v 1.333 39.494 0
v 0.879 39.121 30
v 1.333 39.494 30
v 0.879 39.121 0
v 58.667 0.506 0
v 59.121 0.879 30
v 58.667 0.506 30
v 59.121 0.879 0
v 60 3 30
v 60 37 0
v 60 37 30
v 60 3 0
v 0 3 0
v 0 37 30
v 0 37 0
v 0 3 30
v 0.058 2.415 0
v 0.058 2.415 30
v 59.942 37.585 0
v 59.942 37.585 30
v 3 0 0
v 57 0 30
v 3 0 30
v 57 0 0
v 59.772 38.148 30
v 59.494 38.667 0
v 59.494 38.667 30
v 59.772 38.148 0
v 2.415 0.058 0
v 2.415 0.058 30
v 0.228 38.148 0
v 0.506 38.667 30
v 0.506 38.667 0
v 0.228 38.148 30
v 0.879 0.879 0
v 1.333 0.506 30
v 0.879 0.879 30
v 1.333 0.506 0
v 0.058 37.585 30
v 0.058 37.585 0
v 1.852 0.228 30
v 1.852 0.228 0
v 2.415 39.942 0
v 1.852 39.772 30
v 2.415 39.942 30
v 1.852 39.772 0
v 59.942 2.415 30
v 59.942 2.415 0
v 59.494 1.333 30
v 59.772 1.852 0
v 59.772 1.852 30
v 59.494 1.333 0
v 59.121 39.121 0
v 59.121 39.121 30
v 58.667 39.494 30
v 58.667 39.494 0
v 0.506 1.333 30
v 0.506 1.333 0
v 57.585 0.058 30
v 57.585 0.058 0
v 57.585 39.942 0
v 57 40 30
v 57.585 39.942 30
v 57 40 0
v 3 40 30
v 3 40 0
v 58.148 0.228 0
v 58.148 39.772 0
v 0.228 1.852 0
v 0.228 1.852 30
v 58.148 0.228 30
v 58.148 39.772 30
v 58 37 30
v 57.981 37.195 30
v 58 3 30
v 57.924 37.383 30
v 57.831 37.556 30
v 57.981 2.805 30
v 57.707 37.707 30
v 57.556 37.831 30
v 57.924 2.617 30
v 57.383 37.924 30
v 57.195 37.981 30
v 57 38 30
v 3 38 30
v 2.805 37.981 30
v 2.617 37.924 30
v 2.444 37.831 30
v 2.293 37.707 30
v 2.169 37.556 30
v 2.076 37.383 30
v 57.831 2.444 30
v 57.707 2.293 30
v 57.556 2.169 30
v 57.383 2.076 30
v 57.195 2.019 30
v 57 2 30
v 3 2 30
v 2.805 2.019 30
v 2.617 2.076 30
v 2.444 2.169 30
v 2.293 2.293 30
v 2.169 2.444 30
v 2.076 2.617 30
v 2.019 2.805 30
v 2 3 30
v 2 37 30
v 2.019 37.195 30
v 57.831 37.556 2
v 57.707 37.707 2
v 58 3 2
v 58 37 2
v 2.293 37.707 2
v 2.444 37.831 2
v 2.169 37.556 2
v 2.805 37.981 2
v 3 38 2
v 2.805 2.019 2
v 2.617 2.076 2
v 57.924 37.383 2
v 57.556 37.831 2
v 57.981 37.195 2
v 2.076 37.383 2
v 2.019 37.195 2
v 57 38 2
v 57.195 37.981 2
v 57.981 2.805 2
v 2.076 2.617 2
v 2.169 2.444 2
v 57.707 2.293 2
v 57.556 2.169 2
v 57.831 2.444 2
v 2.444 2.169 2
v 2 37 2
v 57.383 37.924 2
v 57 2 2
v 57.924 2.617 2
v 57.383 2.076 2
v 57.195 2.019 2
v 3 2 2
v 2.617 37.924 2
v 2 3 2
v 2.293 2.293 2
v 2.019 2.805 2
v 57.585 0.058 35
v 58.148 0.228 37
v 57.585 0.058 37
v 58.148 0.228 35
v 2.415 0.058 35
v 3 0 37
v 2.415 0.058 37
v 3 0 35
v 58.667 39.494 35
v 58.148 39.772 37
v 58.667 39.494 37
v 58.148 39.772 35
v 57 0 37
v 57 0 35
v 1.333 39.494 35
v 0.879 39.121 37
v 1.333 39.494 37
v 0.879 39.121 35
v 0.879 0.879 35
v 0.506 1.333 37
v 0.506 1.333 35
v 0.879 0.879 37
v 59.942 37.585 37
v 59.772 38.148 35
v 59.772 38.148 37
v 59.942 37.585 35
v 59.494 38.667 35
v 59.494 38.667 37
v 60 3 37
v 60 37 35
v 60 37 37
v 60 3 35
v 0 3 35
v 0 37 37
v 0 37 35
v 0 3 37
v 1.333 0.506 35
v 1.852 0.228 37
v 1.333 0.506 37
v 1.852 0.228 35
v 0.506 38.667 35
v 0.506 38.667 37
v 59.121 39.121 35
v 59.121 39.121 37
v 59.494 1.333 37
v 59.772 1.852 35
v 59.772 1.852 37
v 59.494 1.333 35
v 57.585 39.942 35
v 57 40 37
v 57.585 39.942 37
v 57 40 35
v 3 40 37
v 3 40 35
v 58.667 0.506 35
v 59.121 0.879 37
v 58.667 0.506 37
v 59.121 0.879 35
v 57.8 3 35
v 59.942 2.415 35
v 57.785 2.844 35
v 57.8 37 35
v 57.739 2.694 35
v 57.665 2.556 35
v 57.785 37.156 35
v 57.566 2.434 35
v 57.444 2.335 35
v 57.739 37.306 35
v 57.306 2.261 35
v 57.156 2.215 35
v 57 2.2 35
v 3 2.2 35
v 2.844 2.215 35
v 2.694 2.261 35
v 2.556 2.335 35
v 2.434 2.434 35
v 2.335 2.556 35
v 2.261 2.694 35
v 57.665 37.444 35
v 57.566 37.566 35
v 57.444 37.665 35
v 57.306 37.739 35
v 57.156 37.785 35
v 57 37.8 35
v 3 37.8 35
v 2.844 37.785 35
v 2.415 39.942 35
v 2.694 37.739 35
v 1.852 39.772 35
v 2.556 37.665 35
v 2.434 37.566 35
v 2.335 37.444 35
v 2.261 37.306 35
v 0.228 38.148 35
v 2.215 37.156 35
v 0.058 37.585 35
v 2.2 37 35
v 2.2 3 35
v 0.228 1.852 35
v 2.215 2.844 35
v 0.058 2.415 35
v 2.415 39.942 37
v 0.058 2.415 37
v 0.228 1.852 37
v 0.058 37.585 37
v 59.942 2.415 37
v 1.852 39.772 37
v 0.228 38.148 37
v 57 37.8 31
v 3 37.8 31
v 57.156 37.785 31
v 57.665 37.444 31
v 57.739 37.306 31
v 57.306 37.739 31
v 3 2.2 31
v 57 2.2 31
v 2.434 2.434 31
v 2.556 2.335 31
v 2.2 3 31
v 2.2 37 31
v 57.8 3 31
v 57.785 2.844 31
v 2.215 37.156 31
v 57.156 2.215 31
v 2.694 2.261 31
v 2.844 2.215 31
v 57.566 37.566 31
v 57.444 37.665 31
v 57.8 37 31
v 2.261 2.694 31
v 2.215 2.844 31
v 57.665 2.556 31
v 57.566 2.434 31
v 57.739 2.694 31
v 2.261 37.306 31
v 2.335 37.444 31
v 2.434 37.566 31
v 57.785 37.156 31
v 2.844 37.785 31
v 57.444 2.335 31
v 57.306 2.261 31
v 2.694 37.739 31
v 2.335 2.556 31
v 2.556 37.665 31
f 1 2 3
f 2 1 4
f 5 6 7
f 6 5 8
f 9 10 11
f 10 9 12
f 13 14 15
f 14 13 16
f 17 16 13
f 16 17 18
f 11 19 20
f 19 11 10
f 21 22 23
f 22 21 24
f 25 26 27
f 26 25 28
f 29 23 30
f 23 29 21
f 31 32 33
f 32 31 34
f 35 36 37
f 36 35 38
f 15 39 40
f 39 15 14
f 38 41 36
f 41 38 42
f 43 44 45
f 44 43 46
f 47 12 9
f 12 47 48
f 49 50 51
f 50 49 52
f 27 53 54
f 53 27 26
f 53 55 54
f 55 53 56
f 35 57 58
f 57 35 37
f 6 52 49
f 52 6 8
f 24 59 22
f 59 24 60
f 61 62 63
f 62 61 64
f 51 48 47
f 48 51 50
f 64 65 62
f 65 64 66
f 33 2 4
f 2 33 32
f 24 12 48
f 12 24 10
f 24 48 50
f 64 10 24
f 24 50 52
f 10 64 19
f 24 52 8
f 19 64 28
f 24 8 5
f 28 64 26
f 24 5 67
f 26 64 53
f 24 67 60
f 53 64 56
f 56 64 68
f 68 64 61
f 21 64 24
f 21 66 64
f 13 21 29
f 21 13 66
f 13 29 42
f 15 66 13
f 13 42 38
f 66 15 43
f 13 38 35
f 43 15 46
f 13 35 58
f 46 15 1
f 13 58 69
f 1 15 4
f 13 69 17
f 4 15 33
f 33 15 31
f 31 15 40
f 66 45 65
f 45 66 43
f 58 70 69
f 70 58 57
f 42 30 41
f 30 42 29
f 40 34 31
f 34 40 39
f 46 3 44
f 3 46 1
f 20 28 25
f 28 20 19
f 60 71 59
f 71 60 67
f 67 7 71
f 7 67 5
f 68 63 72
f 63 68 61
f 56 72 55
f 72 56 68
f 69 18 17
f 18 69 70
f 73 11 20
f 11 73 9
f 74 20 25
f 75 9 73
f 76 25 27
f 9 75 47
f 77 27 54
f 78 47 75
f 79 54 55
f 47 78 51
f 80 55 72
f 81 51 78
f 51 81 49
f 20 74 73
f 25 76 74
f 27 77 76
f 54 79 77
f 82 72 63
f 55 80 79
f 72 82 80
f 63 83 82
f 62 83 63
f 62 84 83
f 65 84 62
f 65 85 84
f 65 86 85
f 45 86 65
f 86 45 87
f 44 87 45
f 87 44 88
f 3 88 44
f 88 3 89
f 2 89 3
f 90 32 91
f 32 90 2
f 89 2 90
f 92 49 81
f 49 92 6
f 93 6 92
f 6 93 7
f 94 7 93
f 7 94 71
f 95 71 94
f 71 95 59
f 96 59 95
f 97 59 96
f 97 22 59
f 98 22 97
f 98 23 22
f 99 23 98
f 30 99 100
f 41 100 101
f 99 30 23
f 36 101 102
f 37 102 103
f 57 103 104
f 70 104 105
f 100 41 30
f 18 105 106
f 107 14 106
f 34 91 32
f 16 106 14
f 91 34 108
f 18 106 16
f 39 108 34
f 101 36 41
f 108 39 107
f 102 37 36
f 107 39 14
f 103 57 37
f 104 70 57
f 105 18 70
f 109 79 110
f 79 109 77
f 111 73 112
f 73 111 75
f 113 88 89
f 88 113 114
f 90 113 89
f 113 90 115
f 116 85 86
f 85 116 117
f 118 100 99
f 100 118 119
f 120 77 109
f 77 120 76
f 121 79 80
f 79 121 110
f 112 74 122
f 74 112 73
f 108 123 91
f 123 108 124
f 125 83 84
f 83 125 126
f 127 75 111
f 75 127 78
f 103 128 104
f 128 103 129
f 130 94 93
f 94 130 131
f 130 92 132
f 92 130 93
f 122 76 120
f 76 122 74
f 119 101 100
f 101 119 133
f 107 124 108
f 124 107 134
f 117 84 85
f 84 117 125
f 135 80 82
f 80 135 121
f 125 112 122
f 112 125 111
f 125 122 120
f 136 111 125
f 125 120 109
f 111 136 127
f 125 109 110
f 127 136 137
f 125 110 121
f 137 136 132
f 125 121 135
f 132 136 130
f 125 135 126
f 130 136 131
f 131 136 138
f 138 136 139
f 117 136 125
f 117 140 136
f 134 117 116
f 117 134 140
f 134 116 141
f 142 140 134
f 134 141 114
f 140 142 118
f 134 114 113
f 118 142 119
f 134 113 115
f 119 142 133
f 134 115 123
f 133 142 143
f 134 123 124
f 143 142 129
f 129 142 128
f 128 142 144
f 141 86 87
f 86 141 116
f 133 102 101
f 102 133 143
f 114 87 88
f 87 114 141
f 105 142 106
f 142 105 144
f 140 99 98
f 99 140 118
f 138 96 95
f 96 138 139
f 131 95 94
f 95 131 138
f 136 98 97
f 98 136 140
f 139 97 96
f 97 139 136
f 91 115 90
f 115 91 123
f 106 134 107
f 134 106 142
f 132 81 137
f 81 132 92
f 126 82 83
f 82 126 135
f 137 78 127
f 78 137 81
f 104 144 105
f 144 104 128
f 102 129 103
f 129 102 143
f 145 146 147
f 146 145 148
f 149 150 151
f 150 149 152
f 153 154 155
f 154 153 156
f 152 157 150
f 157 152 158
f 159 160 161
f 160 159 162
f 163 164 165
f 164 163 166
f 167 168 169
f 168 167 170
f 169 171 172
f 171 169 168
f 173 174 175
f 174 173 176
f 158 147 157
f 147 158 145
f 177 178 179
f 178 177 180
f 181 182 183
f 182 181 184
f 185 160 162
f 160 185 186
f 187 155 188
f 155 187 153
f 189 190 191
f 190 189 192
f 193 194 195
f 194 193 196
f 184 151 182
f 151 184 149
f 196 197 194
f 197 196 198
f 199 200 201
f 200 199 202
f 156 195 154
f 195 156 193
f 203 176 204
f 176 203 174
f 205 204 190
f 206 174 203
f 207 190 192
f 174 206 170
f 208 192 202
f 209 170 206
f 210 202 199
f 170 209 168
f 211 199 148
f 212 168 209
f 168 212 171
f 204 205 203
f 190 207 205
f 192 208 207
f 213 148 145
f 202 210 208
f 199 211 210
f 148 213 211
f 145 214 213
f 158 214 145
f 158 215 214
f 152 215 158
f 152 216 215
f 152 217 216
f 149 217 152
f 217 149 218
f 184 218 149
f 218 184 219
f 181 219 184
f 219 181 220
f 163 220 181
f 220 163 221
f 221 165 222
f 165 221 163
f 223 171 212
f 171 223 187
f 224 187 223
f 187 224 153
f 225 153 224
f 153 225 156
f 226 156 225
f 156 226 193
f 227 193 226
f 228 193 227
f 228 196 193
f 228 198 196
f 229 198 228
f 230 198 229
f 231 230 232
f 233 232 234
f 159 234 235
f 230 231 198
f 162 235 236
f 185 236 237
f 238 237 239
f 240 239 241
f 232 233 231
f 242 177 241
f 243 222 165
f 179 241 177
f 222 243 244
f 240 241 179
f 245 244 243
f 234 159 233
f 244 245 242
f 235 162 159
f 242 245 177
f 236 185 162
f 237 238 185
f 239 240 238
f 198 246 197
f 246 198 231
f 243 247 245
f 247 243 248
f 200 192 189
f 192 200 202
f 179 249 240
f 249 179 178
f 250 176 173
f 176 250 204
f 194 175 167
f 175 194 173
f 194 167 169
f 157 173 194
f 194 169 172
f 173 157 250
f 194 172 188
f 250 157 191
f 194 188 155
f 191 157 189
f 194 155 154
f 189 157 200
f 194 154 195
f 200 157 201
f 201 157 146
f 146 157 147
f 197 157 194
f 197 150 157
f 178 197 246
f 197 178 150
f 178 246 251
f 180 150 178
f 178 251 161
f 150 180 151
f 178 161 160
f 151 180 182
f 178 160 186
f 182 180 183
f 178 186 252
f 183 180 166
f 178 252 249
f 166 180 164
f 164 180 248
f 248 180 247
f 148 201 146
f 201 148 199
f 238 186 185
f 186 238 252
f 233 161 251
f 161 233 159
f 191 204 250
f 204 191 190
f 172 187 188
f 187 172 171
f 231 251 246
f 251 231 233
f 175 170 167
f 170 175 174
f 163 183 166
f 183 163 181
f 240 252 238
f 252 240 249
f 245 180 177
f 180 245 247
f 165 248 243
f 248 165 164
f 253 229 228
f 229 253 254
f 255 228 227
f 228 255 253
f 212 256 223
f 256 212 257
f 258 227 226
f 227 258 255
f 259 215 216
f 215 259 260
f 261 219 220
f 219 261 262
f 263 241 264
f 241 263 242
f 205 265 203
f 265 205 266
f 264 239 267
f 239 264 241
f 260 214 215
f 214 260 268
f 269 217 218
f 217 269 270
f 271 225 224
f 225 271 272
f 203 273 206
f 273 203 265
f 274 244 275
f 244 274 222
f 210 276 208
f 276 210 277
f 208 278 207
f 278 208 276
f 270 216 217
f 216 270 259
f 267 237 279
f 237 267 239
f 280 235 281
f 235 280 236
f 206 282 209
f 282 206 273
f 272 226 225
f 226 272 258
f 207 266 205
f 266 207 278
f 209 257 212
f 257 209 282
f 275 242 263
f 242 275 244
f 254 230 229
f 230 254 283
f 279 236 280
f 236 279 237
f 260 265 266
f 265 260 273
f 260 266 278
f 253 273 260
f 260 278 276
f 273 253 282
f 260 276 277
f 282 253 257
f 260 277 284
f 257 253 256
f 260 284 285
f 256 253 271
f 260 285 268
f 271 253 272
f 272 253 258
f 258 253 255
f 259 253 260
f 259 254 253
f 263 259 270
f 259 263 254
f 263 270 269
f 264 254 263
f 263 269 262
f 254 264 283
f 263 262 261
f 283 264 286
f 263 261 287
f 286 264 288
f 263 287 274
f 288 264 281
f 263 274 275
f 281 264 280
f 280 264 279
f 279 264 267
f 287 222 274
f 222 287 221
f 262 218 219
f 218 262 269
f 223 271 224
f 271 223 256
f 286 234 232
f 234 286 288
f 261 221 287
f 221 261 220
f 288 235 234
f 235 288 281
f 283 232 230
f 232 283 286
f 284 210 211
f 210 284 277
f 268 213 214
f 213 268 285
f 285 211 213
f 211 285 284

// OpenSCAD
// file: ../../libs/common.scad
// common.scad - Shared utility library for all projects
//
// Usage:
//   use <../../libs/common.scad>
//
// Provides: rounded_box, cylinder_with_hole, chamfer_box

// Rounded rectangular box
// Parameters:
//   size  - [x, y, z] dimensions
//   r     - corner radius
//   fn    - number of fragments for curves
module rounded_box(size, r = 2, fn = 32) {
    x = size[0];
    y = size[1];
    z = size[2];
    hull() {
        for (dx = [r, x - r], dy = [r, y - r]) {
            translate([dx, dy, 0])
                cylinder(r = r, h = z, $fn = fn);
        }
    }
}

// Hollow cylinder (tube)
// Parameters:
//   h          - height
//   r_outer    - outer radius
//   r_inner    - inner radius
//   fn         - number of fragments
module cylinder_with_hole(h, r_outer, r_inner, fn = 32) {
    difference() {
        cylinder(h = h, r = r_outer, $fn = fn);
        translate([0, 0, -0.1])
            cylinder(h = h + 0.2, r = r_inner, $fn = fn);
    }
}

// Box with chamfered (angled) top edges
// Parameters:
//   size    - [x, y, z] dimensions
//   chamfer - chamfer size
module chamfer_box(size, chamfer = 1) {
    x = size[0];
    y = size[1];
    z = size[2];
    hull() {
        cube([x, y, z - chamfer]);
        translate([chamfer, chamfer, 0])
            cube([x - 2 * chamfer, y - 2 * chamfer, z]);
    }
}

// M-size screw hole (vertical, countersunk optional)
// Parameters:
//   d          - nominal diameter (e.g. 3 for M3)
//   h          - depth of hole
//   countersink - if true, adds countersink at top
//   fn         - number of fragments
module screw_hole(d, h, countersink = false, fn = 32) {
    r = d / 2;
    union() {
        translate([0, 0, -0.1])
            cylinder(h = h + 0.2, r = r, $fn = fn);
        if (countersink) {
            translate([0, 0, h - d])
                cylinder(h = d + 0.1, r1 = r, r2 = r * 2, $fn = fn);
        }
    }
}
// main file
// example-box/main.scad
// A simple parametric storage box that demonstrates shared library usage.
//
// Build with:
//   python ../../scripts/bundle.py main.scad -o ../../dist/example-box.scad

use <../../libs/common.scad>

/* [Box Dimensions] */
// Width of the box (mm)
box_width  = 60;
// Depth of the box (mm)
box_depth  = 40;
// Height of the box body (mm)
box_height = 30;
// Wall thickness (mm)
wall = 2;
// Corner radius (mm)
corner_radius = 3;

/* [Lid] */
// Include lid in render
show_lid = true;
// Gap between lid and box (mm)
lid_gap = 0.2;
// Lid height (mm)
lid_height = 8;

/* [Hidden] */
$fn = 48;

// ── Main assembly ───────────────────────────────────────────────────────────

// Box body
color("SteelBlue")
    box_body();

// Lid (offset upward for preview)
if (show_lid) {
    color("LightSteelBlue")
        translate([0, 0, box_height + 5])
            lid();
}

// ── Modules ─────────────────────────────────────────────────────────────────

module box_body() {
    difference() {
        // Outer shell
        rounded_box([box_width, box_depth, box_height], r = corner_radius);
        // Inner cavity
        translate([wall, wall, wall])
            rounded_box(
                [box_width  - 2 * wall,
                 box_depth  - 2 * wall,
                 box_height - wall + 0.1],
                r = max(corner_radius - wall, 0.5)
            );
        // Lid channel (top rim cutout for lip fit)
        translate([wall, wall, box_height - lid_height / 2])
            rounded_box(
                [box_width  - 2 * wall,
                 box_depth  - 2 * wall,
                 lid_height / 2 + 0.1],
                r = max(corner_radius - wall, 0.5)
            );
    }
}

module lid() {
    lip_h = lid_height / 2;
    difference() {
        union() {
            // Lid top plate
            rounded_box([box_width, box_depth, wall], r = corner_radius);
            // Lid inner lip
            translate([wall + lid_gap, wall + lid_gap, -lip_h])
                rounded_box(
                    [box_width  - 2 * (wall + lid_gap),
                     box_depth  - 2 * (wall + lid_gap),
                     lip_h],
                    r = max(corner_radius - wall - lid_gap, 0.5)
                );
        }
    }
}
